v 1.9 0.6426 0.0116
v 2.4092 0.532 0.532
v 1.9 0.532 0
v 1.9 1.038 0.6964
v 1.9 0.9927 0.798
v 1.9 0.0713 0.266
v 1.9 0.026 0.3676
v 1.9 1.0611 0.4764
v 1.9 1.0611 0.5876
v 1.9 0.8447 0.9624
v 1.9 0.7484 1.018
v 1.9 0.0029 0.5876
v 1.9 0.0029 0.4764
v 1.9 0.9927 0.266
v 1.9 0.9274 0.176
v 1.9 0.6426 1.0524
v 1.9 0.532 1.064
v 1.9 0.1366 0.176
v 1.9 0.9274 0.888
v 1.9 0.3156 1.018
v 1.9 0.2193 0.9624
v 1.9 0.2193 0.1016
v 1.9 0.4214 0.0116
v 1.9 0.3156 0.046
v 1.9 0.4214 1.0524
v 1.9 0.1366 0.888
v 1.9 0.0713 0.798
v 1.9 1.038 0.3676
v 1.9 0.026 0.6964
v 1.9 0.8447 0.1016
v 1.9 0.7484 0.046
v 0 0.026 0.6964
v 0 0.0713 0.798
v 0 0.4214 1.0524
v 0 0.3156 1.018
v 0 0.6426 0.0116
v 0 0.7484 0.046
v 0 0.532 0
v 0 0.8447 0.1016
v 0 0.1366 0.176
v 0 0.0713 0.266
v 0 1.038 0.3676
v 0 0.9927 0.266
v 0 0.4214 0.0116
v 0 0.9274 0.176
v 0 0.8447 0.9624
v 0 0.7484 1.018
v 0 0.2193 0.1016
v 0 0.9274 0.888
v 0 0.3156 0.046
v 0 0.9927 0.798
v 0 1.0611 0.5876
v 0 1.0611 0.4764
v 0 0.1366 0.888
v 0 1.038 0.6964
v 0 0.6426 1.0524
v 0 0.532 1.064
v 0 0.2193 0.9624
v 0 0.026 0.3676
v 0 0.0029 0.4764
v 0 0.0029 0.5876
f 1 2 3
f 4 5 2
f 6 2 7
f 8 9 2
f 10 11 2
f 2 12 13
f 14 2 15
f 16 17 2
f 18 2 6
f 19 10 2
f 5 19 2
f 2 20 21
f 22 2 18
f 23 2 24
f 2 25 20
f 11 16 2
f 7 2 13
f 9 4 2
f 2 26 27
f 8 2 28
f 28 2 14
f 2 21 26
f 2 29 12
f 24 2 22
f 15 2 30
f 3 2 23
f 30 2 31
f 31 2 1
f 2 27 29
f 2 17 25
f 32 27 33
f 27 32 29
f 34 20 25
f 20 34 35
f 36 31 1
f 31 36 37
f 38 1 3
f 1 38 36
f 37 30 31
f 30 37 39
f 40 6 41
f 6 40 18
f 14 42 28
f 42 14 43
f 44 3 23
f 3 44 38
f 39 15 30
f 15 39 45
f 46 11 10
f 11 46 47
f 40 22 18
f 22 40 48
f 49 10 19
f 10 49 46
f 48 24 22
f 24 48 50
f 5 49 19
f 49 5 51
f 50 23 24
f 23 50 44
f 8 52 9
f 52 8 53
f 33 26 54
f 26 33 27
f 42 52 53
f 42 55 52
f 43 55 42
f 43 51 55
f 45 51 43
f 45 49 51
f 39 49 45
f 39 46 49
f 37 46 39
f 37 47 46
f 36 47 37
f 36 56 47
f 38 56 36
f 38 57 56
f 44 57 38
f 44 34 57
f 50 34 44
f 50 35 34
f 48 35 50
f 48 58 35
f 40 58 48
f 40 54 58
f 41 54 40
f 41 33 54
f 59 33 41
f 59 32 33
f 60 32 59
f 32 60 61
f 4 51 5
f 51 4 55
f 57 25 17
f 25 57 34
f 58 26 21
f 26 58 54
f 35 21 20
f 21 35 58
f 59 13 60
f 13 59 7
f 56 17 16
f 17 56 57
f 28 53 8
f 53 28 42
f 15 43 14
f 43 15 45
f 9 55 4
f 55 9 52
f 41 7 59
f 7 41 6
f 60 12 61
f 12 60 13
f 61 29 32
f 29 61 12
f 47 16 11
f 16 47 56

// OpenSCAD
// file: orientation.scad
/**
 * Apply LEF/DEF style orientation changes specified by a text flag.
 * See LEF/DEF 5.8 Language Reference manual page 244
 * There is currently no way in OpenSCAD to determine bounding box
 * to do automatic translation, you will need to provide it.
 */
module orient(bounds, orient) {
    width = bounds[0];
    height = bounds[1];
    if (orient == "N" || orient == "R0"){
        children();
    } else if (orient == "S" || orient == "R180"){
        translate([width, height, 0])
        rotate([0, 0, 180])
        children();
    } else if (orient == "E" || orient == "R270") {
        translate([0, width, 0])
        rotate([0, 0, 270])
        children();
    } else if (orient == "W" || orient == "R90") {
        translate([height, 0, 0])
        rotate([0, 0, 90])
        children();
    } else if (orient == "FN" || orient == "MY"){
        translate([width, 0, 0])
        mirror([1, 0, 0])
        children();
    } else if (orient == "FS" || orient == "MX"){
        translate([0, height, 0])
        mirror([0, 1, 0])
        children();
    } else if (orient == "FE" || orient == "MY90" || orient == "MYR90") {
        translate([height, width, 0])
        rotate([0, 0, 270])
        mirror([0, 1, 0])
        children();
    } else if (orient == "FW" || orient == "MX90" || orient == "MXR90") {
        translate([0, 0, 0])
        rotate([0, 0, 270])
        mirror([1, 0, 0])
        children();
    } else {
        assert(false, concat("Unknown rotation applied", orient));
    }
}
// main file
use <orientation.scad>
module pinhole(xpos, ypos, zpos, orientation,
    diameter=140, length=260, cone=67,
    px=7.6e-3, layer=10e-3, lpv=20, chan_h=10, chan_w=14, shape="cube", pitch=30, $fn=30)
{
    // Note that diameter is consistent across height and thus not in layer unit.
    scale([px, px, px])
    translate([xpos, ypos, zpos])
    orient([length+cone, diameter], orientation)
    translate([0, diameter/2, diameter/2])
    rotate([0, 90, 0])
        union(){
        translate([0, 0, length])
        cylinder(h = cone, d1 = diameter, d2 = 0);

        cylinder(d = diameter, h = length);
    };
}

pinhole(0, 0, 0, "N", 140, 250, 67);
